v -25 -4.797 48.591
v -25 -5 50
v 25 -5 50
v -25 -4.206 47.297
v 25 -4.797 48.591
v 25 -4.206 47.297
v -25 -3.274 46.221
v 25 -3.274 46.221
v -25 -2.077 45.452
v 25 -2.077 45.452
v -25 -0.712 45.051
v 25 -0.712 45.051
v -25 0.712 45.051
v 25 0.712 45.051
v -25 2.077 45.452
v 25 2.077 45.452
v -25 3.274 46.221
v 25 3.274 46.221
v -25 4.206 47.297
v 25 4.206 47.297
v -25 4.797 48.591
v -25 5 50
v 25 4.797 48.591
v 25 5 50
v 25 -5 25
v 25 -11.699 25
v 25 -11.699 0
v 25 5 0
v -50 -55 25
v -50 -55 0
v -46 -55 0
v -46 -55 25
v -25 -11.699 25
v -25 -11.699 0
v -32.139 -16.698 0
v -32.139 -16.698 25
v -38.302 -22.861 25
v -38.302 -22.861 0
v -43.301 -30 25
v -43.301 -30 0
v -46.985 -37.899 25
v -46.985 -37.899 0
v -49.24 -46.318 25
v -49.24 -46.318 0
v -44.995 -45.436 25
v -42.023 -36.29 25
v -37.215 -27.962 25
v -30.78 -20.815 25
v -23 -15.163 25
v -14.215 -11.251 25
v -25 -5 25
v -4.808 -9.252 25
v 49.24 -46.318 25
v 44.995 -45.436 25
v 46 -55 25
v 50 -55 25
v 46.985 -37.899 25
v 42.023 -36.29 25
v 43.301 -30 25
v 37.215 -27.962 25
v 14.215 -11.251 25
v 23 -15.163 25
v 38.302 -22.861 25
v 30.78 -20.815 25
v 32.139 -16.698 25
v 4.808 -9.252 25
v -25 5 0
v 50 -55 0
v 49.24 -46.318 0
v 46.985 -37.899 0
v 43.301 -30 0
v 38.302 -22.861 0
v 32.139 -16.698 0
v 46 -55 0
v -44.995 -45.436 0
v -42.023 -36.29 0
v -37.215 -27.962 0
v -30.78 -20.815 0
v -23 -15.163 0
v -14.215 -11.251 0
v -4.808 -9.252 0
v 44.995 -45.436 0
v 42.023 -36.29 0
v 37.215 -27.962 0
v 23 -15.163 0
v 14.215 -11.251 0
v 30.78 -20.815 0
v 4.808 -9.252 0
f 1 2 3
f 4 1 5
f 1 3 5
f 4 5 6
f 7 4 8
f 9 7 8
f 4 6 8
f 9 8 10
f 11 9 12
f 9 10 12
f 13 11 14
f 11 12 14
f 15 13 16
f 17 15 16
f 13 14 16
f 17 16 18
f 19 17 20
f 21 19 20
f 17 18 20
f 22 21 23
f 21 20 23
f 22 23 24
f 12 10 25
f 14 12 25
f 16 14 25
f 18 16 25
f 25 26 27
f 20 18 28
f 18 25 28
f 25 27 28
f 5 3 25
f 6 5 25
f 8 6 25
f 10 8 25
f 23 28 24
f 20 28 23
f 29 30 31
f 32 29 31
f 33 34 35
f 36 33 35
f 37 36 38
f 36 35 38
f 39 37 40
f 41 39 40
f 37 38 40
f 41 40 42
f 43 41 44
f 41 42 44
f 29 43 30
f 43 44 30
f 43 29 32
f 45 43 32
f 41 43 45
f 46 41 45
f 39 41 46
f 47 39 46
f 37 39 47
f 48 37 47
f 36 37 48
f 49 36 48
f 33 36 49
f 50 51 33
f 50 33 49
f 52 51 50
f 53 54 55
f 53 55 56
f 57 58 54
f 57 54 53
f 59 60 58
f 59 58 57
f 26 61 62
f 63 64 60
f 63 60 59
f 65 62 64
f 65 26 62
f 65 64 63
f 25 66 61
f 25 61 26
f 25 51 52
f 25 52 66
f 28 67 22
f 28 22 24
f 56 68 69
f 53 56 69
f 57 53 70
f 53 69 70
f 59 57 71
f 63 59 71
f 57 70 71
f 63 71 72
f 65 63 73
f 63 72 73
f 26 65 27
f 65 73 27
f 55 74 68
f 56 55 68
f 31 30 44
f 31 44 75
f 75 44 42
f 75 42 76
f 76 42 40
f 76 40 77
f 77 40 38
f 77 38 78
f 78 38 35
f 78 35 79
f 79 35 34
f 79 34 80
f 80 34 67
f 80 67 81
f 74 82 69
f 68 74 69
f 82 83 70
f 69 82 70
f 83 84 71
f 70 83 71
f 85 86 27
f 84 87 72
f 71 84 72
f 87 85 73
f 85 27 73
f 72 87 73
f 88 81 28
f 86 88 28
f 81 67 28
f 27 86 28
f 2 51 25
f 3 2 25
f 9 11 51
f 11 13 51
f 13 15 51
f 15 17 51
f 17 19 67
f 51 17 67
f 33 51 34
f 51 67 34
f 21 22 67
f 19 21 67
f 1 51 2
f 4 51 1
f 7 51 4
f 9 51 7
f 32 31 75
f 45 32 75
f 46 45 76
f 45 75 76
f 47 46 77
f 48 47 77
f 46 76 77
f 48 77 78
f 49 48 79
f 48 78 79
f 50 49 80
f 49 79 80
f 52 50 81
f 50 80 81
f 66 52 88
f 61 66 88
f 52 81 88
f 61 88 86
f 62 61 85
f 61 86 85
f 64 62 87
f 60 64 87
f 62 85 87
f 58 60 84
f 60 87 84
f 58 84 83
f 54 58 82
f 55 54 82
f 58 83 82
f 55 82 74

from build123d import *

# Parameters (mm, degrees)
SKETCH_1_W          = 50
SKETCH_1_H          = 10
EXTRUDE_1_DEPTH     = 50
EXTRUDE_3_DEPTH     = 25
SKETCH_5_R          = 5
CUT_EXTRUDE_2_DEPTH = 106.59356041


with BuildPart() as part:
    # 草图1 → 凸台-拉伸1 (new body)
    with BuildSketch(Plane.XY):
        Rectangle(SKETCH_1_W, SKETCH_1_H)
    extrude(amount=EXTRUDE_1_DEPTH)

    # 草图4 → 凸台-拉伸3 (add)
    with BuildSketch(Plane(origin=(0, 0, 0), x_dir=(-1, 0, 0), z_dir=(0, 0, -1))):
        with BuildLine():
            Line((-25, -5), (25, -5))
            Line((25, -5), (25, -11.698729811))
            ThreePointArc((25, -11.698729811), (43.301270189, -30), (50, -55))
            Line((50, -55), (46, -55))
            ThreePointArc((46, -55), (0, -9), (-46, -55))
            Line((-46, -55), (-50, -55))
            ThreePointArc((-50, -55), (-43.301270189, -30), (-25, -11.698729811))
            Line((-25, -11.698729811), (-25, -5))
        make_face()
    extrude(amount=-EXTRUDE_3_DEPTH)

    # 草图5 → 切除-拉伸2 (cut, through all)
    with BuildSketch(Plane(origin=(25, 0, 0), x_dir=(0, 0, -1), z_dir=(1, 0, 0))):
        with Locations((-50, 0)):
            Circle(SKETCH_5_R)
    extrude(amount=-CUT_EXTRUDE_2_DEPTH, mode=Mode.SUBTRACT)


solid = part.part
